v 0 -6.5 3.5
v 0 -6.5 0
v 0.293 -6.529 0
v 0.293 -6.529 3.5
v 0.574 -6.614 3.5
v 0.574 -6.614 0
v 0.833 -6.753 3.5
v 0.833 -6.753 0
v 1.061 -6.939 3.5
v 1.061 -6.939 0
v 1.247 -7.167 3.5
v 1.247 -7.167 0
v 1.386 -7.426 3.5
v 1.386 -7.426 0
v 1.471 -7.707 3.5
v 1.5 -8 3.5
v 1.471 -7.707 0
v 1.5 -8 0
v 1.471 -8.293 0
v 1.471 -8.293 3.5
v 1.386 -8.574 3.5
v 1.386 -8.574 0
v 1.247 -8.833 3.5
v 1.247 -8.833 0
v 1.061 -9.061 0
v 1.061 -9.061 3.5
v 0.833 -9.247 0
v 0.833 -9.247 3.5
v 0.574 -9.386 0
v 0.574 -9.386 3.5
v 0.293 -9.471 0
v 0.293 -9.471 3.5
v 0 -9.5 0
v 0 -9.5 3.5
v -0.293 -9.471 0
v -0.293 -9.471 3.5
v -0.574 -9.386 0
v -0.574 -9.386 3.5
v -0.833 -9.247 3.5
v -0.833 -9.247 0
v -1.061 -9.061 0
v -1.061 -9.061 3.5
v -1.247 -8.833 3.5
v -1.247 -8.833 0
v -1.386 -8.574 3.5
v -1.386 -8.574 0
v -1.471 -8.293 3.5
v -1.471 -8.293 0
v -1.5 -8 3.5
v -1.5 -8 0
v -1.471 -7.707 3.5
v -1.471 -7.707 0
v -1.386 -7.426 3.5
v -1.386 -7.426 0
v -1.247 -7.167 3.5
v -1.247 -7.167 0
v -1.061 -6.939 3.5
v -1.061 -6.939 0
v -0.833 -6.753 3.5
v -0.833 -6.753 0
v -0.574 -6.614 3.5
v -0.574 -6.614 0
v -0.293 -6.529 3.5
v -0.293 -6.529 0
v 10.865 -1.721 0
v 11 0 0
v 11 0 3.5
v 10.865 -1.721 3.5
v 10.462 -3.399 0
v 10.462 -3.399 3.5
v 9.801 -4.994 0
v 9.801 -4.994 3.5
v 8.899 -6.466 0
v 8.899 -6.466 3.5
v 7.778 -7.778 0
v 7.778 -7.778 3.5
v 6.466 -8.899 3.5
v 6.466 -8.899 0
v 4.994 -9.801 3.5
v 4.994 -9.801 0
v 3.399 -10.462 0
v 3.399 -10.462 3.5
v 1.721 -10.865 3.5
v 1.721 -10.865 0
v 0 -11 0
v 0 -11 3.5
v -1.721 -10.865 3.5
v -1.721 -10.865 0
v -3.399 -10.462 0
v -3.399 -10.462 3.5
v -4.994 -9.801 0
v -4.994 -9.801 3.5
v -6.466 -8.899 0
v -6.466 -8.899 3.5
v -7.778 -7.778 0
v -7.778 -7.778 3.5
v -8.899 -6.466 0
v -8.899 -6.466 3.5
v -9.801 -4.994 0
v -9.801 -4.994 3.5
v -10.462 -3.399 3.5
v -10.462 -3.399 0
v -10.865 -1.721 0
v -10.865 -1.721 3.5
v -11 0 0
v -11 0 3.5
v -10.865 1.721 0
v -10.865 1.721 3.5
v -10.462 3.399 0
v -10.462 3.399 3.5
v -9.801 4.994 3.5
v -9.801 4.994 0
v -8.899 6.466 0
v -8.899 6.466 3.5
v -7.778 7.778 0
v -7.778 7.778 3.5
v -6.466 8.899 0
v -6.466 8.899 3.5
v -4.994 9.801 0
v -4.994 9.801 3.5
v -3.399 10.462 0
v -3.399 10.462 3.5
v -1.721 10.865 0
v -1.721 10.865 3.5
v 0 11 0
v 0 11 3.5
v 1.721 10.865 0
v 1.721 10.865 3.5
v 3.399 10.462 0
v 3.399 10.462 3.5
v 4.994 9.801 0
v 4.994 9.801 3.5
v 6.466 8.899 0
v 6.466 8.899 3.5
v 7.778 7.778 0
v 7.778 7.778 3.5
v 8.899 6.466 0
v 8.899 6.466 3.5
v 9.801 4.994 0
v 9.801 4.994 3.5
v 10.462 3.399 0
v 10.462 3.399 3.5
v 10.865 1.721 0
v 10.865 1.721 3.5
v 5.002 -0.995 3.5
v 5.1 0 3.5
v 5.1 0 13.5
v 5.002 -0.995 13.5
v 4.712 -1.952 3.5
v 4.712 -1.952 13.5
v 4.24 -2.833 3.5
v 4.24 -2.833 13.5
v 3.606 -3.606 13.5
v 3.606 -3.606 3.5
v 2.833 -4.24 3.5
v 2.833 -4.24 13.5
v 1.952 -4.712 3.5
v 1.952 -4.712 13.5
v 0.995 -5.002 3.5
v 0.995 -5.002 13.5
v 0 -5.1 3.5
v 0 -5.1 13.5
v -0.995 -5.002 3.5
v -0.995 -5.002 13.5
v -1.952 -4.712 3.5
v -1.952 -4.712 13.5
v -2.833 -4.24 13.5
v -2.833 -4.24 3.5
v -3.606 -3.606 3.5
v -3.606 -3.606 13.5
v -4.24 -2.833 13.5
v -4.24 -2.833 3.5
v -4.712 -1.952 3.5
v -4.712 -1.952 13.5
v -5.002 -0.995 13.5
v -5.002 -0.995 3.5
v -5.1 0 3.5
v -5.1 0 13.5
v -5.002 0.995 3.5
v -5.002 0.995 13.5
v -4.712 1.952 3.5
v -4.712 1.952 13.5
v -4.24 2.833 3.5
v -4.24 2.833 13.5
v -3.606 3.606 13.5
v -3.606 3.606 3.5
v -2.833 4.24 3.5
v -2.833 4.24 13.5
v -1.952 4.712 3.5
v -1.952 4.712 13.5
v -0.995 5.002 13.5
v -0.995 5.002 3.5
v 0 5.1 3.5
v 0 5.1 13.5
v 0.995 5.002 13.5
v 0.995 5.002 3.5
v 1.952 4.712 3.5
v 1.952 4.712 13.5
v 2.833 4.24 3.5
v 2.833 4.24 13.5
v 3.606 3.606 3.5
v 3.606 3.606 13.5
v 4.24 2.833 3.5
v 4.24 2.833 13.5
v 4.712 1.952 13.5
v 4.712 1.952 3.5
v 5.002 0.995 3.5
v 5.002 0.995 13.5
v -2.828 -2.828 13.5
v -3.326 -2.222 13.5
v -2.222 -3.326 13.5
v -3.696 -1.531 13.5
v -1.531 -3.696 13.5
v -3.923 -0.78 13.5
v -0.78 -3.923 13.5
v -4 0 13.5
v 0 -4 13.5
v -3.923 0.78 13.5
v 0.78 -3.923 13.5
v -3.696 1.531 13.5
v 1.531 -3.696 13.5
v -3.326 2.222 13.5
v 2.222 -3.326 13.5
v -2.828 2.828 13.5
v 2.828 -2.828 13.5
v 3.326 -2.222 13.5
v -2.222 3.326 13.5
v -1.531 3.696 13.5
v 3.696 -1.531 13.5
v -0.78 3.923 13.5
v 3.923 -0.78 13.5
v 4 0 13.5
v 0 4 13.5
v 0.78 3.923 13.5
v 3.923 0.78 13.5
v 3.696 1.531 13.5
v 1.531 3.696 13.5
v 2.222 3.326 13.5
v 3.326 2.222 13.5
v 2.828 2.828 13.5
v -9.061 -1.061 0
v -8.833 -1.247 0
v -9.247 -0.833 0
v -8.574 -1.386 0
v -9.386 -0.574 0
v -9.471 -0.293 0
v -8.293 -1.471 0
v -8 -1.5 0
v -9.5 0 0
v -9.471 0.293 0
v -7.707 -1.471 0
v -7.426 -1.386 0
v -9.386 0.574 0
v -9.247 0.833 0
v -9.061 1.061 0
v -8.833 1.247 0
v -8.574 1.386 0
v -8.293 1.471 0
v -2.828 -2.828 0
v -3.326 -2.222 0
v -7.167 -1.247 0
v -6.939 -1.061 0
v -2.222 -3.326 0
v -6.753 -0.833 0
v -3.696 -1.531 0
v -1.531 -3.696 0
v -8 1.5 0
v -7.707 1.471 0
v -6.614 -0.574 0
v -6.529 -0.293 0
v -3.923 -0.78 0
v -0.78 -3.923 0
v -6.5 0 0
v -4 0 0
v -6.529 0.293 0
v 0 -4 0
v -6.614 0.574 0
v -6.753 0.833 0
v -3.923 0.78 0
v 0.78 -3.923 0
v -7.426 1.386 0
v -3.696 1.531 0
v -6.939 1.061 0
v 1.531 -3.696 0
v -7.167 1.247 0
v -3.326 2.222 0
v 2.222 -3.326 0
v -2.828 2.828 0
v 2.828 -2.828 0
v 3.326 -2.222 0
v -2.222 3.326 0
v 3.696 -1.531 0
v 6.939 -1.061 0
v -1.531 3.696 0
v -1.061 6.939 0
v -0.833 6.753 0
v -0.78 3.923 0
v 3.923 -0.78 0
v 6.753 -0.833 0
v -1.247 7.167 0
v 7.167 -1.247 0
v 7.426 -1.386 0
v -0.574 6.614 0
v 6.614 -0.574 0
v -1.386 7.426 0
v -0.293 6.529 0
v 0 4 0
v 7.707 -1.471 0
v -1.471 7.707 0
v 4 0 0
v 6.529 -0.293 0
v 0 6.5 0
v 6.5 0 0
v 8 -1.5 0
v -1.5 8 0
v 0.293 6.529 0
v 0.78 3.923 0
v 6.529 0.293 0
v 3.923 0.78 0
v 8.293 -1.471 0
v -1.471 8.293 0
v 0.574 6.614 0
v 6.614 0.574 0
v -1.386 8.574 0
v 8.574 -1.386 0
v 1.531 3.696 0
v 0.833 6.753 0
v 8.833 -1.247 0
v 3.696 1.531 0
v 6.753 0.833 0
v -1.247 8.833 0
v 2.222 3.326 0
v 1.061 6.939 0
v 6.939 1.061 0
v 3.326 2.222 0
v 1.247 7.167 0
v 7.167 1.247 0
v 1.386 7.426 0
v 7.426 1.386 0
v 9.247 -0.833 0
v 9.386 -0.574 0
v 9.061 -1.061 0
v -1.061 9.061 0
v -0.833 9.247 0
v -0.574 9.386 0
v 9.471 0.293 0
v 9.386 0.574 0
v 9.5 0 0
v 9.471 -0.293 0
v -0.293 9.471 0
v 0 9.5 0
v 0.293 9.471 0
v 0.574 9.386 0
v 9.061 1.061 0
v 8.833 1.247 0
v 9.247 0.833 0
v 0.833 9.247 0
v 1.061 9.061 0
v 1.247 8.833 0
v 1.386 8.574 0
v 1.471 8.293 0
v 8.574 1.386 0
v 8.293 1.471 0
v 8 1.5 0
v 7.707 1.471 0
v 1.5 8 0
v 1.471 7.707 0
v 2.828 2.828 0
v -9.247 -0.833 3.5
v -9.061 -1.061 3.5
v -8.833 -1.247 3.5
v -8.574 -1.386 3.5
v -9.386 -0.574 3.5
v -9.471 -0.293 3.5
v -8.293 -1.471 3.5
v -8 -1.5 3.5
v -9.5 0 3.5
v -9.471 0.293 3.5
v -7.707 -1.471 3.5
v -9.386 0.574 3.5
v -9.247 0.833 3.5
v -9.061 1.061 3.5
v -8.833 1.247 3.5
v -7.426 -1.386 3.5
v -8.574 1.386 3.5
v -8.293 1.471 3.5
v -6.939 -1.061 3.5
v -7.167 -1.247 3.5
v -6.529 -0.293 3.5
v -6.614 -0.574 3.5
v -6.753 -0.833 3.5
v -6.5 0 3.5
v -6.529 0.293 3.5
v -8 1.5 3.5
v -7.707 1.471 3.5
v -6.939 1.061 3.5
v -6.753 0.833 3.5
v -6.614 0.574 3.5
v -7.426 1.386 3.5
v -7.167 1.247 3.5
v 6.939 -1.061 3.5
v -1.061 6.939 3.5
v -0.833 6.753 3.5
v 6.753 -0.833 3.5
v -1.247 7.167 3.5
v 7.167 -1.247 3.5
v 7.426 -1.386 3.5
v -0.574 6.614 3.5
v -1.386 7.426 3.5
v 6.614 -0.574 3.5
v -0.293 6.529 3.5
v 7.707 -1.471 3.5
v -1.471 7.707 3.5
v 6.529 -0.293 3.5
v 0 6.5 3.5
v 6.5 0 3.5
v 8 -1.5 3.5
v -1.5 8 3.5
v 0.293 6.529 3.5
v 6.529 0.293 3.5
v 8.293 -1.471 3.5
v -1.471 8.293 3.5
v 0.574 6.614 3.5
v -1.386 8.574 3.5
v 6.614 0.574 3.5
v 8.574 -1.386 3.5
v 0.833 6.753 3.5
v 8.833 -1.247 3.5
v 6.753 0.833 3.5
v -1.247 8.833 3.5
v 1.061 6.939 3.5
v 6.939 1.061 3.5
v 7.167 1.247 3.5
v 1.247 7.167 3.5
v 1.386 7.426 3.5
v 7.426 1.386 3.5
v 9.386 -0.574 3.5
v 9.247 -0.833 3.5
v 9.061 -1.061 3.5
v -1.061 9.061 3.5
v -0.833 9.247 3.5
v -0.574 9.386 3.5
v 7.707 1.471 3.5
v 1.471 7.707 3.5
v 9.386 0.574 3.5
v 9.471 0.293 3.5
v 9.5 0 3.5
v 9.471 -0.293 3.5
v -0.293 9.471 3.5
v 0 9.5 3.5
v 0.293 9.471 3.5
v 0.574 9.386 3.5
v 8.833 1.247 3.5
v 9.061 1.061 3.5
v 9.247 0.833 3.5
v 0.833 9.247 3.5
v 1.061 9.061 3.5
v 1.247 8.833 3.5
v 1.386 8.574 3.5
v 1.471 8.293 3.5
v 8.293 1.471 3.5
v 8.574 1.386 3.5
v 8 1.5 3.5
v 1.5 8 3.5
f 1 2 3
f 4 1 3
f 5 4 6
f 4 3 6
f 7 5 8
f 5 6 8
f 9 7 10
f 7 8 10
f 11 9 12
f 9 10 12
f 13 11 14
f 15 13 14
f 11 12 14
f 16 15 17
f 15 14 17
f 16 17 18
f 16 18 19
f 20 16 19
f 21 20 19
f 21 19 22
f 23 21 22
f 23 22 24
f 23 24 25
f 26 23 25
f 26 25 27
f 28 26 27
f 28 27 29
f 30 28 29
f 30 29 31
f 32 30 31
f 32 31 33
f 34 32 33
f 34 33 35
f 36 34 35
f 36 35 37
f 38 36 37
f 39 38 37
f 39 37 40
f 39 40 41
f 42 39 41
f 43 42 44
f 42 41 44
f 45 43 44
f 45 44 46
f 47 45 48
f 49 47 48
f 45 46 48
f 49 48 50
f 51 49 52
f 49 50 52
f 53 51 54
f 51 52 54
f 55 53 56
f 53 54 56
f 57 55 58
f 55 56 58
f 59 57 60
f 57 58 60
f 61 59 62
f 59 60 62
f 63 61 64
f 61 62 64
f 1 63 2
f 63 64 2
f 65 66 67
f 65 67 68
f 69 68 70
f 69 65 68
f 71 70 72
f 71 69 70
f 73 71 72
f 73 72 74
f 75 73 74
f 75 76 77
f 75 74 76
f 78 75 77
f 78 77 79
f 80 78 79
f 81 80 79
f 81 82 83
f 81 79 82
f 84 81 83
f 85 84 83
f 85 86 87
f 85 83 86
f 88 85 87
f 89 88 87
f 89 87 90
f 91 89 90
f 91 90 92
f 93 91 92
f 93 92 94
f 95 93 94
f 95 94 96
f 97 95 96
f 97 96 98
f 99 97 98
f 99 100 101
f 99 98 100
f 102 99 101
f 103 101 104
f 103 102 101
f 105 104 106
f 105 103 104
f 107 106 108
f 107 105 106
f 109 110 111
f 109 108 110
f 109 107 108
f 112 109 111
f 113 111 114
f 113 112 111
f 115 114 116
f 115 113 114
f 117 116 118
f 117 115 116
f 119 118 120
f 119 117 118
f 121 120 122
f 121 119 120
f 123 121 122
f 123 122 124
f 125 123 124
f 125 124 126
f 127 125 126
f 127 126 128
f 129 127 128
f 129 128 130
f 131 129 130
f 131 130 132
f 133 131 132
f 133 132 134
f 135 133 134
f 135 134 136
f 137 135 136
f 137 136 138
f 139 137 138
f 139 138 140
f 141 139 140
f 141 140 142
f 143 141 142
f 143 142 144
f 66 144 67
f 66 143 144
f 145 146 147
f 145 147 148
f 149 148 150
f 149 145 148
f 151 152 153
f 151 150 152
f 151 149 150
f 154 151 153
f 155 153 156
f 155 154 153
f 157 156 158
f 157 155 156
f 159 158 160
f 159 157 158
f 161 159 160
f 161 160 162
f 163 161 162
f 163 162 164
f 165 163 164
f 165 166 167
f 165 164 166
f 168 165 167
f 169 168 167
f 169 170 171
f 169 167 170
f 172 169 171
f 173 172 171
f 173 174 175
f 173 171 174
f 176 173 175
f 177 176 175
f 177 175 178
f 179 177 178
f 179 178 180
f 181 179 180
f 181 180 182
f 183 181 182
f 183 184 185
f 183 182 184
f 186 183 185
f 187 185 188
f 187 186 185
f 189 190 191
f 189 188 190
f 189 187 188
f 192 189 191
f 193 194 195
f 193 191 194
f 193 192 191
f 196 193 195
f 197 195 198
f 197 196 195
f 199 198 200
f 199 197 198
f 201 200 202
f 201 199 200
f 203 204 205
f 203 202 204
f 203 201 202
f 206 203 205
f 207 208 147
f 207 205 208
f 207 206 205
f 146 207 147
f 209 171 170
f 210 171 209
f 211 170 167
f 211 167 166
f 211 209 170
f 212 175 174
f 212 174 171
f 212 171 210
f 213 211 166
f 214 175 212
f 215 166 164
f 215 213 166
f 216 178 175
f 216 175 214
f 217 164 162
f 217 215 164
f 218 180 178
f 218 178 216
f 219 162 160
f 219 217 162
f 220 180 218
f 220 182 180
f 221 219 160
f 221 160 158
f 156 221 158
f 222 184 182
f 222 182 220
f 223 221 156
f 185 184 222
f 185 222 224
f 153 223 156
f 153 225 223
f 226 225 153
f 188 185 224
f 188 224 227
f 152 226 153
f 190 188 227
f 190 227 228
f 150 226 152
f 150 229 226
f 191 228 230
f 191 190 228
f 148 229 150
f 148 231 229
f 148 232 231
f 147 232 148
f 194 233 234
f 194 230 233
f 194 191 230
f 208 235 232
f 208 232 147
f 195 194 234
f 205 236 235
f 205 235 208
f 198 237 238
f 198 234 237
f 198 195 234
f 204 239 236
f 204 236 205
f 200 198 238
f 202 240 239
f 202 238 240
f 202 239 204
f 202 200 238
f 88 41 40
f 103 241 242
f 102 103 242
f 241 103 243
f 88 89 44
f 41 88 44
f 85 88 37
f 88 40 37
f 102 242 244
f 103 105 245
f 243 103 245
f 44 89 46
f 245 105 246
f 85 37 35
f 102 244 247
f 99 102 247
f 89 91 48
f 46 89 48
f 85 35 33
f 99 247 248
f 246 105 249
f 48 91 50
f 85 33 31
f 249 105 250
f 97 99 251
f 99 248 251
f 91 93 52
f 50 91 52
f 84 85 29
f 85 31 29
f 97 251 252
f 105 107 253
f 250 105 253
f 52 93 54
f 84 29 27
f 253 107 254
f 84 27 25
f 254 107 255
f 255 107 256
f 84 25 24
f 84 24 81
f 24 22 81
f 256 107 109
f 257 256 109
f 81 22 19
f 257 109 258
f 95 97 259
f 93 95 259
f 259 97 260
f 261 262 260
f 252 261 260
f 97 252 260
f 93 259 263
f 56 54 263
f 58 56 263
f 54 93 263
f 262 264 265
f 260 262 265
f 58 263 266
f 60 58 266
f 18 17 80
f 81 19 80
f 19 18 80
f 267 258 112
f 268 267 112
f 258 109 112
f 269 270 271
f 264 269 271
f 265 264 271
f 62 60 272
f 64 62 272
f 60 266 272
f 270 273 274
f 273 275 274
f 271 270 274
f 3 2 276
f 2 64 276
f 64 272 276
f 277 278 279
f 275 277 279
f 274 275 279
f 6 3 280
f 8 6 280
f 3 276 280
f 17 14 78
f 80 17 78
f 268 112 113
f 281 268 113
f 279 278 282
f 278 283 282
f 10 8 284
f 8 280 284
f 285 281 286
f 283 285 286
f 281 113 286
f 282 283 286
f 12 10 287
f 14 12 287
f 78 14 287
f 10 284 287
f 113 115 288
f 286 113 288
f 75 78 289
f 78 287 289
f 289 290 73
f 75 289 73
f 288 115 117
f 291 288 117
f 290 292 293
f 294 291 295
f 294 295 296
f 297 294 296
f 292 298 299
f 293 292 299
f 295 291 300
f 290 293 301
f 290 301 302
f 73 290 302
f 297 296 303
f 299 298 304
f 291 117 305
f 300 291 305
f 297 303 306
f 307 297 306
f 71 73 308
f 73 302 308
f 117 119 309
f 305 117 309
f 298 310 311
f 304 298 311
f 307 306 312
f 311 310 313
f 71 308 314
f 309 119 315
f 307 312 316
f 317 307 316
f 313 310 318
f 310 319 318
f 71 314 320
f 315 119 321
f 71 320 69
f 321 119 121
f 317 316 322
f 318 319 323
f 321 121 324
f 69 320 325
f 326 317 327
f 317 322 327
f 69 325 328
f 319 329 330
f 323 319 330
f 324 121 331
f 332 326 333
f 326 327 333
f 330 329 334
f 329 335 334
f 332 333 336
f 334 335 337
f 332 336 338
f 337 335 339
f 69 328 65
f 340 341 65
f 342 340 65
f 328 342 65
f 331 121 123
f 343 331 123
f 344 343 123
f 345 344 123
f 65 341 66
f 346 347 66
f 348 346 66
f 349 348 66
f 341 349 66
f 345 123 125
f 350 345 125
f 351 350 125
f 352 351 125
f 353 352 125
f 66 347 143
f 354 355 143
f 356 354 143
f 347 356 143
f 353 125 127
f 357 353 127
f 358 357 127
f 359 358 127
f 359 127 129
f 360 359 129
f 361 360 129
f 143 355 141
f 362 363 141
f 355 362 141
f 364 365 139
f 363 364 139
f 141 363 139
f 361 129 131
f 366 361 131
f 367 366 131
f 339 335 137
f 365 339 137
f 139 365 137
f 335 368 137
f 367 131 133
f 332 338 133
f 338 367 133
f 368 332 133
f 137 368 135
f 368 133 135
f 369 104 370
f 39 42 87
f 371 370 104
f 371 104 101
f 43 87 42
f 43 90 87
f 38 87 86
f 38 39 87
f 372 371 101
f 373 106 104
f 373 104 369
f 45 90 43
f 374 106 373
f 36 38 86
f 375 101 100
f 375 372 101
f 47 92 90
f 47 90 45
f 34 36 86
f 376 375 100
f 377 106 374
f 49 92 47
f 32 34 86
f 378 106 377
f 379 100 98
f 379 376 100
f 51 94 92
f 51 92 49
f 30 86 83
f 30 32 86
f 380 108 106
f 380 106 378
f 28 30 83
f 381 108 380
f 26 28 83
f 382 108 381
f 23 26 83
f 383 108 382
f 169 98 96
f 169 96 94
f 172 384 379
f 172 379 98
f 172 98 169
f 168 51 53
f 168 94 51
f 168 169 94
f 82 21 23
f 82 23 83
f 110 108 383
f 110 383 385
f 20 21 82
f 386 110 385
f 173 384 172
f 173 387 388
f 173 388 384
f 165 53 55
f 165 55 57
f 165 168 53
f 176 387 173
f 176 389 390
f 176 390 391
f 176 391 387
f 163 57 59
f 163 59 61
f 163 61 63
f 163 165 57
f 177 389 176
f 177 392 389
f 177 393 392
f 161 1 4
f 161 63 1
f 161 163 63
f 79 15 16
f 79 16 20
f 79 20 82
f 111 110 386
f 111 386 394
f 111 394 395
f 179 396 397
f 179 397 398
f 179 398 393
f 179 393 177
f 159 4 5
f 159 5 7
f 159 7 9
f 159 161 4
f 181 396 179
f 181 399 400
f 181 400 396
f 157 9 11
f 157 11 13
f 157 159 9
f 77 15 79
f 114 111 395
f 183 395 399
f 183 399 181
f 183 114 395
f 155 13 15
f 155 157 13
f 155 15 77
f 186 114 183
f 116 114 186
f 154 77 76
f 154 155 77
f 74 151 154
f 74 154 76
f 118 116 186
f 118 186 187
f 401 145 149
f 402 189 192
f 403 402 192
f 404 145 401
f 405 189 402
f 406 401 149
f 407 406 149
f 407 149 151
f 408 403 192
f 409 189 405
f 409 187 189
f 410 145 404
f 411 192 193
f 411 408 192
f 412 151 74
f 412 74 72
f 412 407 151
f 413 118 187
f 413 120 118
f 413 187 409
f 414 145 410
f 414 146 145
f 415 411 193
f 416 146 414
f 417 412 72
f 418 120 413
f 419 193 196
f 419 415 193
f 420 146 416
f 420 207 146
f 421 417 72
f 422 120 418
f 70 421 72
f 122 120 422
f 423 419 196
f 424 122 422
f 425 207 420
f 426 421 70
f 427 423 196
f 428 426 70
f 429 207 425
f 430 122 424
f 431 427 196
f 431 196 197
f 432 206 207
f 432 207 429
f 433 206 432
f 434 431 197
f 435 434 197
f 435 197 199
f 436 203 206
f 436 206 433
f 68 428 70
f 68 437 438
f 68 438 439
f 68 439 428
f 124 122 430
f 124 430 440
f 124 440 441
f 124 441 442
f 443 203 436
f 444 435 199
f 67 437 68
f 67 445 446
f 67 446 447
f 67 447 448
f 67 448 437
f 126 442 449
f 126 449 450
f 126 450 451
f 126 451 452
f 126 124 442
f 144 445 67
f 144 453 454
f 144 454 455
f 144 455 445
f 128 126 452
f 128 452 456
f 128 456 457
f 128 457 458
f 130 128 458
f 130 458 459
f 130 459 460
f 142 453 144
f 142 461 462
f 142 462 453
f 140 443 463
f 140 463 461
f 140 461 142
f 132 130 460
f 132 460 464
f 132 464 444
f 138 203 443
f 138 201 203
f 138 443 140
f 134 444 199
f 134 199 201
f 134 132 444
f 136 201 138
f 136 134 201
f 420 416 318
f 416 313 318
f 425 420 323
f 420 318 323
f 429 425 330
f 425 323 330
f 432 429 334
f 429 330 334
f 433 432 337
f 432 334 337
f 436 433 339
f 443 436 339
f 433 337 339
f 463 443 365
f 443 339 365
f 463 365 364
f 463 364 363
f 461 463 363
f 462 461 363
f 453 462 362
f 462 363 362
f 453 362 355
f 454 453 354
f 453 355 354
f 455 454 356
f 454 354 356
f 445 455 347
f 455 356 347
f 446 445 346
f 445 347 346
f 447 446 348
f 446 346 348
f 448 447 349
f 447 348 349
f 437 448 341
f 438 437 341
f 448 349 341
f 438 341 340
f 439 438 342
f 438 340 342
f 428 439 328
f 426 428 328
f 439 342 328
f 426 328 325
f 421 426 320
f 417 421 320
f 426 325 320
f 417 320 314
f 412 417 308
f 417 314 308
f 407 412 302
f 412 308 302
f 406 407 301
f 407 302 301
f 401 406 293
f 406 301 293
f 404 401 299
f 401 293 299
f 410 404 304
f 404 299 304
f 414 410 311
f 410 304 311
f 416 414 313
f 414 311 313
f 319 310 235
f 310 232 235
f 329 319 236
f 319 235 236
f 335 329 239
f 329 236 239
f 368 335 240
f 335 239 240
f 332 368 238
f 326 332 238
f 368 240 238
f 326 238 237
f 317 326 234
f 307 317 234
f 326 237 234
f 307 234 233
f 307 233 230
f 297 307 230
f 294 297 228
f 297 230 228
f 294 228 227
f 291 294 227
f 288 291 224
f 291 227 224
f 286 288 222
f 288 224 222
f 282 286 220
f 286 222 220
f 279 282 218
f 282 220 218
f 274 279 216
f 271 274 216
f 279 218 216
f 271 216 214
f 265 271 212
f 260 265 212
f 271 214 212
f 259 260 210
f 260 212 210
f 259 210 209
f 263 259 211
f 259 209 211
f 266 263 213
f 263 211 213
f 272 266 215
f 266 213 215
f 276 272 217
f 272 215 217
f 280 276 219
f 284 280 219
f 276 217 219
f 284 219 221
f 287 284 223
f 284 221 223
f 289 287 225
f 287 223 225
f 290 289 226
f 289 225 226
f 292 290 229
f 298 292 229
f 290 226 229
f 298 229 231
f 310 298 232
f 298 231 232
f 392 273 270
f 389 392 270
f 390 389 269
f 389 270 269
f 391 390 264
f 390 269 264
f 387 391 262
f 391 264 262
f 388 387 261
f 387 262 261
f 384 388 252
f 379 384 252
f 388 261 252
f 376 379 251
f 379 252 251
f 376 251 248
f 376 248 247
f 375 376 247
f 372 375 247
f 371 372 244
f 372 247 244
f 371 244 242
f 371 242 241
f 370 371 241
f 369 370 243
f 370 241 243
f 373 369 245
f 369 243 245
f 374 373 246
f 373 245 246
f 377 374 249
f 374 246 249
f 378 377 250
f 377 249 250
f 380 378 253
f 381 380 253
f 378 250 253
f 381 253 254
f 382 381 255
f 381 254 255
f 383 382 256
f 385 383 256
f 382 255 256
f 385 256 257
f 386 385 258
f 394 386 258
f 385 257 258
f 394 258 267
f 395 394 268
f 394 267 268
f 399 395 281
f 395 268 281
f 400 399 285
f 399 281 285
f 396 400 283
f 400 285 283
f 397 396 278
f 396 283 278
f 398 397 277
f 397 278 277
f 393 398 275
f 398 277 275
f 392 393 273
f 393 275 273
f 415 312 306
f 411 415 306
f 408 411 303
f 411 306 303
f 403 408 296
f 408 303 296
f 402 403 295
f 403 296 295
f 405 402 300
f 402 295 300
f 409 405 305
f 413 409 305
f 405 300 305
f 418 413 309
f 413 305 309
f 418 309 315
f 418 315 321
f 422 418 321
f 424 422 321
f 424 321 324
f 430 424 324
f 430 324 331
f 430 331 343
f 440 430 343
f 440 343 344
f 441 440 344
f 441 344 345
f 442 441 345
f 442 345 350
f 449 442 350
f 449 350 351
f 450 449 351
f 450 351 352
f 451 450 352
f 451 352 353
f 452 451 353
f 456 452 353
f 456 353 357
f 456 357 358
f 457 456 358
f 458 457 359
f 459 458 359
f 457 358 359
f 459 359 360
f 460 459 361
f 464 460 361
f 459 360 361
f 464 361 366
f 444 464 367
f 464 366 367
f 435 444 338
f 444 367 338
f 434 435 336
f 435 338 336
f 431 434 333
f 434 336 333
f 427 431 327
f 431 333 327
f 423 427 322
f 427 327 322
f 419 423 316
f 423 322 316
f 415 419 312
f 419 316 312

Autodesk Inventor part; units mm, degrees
ref_plane "YZ Plane" through (0, 0, 0) normal (1, 0, 0) x (0, 1, 0)
ref_plane "XZ Plane" through (0, 0, 0) normal (0, 1, 0) x (-1, 0, 0)
ref_plane "XY Plane" through (0, 0, 0) normal (0, 0, 1) x (1, 0, 0)
sketch "Sketch1" plane through (0, 0, 0) normal (0, 0, 1) x (1, 0, 0)
  circle A0 centre (0, 0) radius 11
  dimension "d0" = 22
extrude "Extrusion1" add sketch "Sketch1" along normal blind 3.5
sketch "Sketch2" plane through (0, 0, 3.5) normal (0, 0, 1) x (1, 0, 0)
  circle A0 centre (0, 0) radius 5.1
  dimension "d3" = 10.2
extrude "Extrusion2" add sketch "Sketch2" along normal blind 10
sketch "Sketch3" plane through (0, 0, 3.5) normal (0, 0, 1) x (1, 0, 0)
  circle A0 centre (0, 0) radius 5.1 projected
  point P0 (0, 8)
  dimension "d7" = 8
hole "Hole1" at (0, 8, 3.5) direction (0, 0, -1) diameter 3 depth 8 tip angle 118
pattern_circular "Circular Pattern1" count 4 over 360 about axis through (0, 0, 3.5) along (0, 0, 1) of "Hole1"
sketch "Sketch4" plane through (0, 0, 13.5) normal (0, 0, 1) x (1, 0, 0)
  circle A0 centre (0, 0) radius 4
  dimension "d18" = 8
extrude "Extrusion3" cut sketch "Sketch4" against normal through all
thread "Thread1" size "M8x1.25" class "6H" standard "ANSI Metric M Profile" full length
properties part number "m8 nut"
